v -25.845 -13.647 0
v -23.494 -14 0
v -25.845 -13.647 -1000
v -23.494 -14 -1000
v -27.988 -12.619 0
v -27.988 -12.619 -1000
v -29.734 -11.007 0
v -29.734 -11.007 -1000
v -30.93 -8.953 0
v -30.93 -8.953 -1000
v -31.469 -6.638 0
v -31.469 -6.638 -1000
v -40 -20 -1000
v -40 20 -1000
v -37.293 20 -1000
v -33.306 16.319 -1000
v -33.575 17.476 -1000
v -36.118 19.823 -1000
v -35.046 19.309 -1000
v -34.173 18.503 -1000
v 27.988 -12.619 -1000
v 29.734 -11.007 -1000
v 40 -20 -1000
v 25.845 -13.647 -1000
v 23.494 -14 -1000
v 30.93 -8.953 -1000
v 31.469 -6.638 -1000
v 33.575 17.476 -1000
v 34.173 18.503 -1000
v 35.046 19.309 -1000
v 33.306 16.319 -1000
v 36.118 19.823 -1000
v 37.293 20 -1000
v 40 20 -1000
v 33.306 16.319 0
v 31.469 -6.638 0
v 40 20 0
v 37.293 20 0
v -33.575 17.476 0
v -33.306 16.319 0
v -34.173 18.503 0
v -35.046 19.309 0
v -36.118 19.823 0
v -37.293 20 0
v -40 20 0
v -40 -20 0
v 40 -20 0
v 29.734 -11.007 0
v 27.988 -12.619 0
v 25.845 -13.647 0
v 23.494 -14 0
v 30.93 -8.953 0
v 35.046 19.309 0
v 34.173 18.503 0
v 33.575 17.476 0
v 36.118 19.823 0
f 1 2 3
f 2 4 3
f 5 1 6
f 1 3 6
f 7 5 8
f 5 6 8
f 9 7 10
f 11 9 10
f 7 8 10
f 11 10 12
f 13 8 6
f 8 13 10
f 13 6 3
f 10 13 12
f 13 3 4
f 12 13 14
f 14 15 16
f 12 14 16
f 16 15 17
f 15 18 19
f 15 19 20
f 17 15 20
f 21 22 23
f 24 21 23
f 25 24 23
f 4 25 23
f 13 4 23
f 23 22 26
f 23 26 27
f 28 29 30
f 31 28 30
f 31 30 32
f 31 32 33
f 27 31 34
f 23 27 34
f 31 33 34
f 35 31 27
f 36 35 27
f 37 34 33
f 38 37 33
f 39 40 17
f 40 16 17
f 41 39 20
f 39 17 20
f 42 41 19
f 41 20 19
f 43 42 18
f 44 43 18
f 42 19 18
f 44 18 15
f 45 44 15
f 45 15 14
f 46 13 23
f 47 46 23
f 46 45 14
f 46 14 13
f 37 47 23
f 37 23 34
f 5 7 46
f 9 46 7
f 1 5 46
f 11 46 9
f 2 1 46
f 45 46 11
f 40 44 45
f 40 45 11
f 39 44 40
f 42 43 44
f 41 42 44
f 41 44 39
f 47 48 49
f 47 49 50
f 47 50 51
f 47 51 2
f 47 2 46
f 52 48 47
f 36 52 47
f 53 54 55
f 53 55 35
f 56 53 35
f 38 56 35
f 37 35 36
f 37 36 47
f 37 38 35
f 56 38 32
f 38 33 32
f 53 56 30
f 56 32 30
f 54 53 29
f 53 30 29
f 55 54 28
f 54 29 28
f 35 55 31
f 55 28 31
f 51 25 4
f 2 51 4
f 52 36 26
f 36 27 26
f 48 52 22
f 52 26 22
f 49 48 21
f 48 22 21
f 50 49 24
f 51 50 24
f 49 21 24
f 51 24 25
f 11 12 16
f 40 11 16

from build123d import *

# Parameters (mm, degrees)
F1_DEPTH = 1000
F2_R     = 4
F3_R     = 8


with BuildPart() as f1:
    # F0 (on Top) → F1 (new body)
    with BuildSketch(Plane.XY):
        Polygon((-40, 20), (-40, -20), (40, -20), (40, 20), (33.600028, 20), (30.879981, -14), (-30.879981, -14), (-33.600028, 20), align=None)
    extrude(amount=-F1_DEPTH)

    # F2
    f2_edges = [f1.edges().sort_by_distance(p)[0] for p in [
        (-33.600028, 20, -500),
        (33.600028, 20, -500),
    ]]
    fillet(f2_edges, radius=F2_R)

    # F3
    f3_edges = [f1.edges().sort_by_distance(p)[0] for p in [
        (-30.879981, -14, -500),
        (30.879981, -14, -500),
    ]]
    fillet(f3_edges, radius=F3_R)


solid = f1.part
